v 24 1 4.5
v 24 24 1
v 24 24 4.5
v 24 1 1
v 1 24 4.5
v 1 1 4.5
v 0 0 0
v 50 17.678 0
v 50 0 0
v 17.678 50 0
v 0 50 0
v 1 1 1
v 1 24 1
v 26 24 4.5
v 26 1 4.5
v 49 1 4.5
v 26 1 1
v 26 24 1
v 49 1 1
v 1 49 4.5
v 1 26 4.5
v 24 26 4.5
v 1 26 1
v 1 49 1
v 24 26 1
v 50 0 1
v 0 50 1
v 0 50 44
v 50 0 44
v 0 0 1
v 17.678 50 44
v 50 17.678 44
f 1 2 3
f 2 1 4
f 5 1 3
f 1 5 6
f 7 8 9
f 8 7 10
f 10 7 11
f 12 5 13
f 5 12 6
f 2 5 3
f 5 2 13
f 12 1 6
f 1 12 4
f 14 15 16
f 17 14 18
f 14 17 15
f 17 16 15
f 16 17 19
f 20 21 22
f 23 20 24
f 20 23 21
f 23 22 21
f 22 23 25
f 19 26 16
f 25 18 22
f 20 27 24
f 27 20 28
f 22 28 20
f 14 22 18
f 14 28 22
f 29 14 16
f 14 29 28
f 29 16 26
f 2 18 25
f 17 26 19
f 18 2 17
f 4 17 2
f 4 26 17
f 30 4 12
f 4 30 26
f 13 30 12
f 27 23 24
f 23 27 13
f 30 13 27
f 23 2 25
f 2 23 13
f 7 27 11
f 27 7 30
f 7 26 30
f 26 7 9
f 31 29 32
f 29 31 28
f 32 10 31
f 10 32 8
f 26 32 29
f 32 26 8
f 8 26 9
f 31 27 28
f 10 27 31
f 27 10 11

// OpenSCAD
color("LightGray") {
    intersection() {
        union() {
            translate([1,1,0]) cube([23,23,4.5]);
            translate([25+1,1,0]) cube([23,23,4.5]);
            translate([1,25+1,0]) cube([23,23,4.5]);
            translate([25+1,25+1,0]) cube([23,23,4.5]);
        }
        translate([50,0,0]) rotate([0,0,90+45]) cube([75,75,75]);
    }
}

color("Grey") {
    intersection() {
        cube([50,50,7-6]);
        translate([50,0,0]) rotate([0,0,90+45]) cube([75,75,75]);
    }
    intersection() {
        translate([50,0,0]) rotate([0,0,45]) cube([12.5,75,50-6]);
        cube([50,50,50]);
    }
}
